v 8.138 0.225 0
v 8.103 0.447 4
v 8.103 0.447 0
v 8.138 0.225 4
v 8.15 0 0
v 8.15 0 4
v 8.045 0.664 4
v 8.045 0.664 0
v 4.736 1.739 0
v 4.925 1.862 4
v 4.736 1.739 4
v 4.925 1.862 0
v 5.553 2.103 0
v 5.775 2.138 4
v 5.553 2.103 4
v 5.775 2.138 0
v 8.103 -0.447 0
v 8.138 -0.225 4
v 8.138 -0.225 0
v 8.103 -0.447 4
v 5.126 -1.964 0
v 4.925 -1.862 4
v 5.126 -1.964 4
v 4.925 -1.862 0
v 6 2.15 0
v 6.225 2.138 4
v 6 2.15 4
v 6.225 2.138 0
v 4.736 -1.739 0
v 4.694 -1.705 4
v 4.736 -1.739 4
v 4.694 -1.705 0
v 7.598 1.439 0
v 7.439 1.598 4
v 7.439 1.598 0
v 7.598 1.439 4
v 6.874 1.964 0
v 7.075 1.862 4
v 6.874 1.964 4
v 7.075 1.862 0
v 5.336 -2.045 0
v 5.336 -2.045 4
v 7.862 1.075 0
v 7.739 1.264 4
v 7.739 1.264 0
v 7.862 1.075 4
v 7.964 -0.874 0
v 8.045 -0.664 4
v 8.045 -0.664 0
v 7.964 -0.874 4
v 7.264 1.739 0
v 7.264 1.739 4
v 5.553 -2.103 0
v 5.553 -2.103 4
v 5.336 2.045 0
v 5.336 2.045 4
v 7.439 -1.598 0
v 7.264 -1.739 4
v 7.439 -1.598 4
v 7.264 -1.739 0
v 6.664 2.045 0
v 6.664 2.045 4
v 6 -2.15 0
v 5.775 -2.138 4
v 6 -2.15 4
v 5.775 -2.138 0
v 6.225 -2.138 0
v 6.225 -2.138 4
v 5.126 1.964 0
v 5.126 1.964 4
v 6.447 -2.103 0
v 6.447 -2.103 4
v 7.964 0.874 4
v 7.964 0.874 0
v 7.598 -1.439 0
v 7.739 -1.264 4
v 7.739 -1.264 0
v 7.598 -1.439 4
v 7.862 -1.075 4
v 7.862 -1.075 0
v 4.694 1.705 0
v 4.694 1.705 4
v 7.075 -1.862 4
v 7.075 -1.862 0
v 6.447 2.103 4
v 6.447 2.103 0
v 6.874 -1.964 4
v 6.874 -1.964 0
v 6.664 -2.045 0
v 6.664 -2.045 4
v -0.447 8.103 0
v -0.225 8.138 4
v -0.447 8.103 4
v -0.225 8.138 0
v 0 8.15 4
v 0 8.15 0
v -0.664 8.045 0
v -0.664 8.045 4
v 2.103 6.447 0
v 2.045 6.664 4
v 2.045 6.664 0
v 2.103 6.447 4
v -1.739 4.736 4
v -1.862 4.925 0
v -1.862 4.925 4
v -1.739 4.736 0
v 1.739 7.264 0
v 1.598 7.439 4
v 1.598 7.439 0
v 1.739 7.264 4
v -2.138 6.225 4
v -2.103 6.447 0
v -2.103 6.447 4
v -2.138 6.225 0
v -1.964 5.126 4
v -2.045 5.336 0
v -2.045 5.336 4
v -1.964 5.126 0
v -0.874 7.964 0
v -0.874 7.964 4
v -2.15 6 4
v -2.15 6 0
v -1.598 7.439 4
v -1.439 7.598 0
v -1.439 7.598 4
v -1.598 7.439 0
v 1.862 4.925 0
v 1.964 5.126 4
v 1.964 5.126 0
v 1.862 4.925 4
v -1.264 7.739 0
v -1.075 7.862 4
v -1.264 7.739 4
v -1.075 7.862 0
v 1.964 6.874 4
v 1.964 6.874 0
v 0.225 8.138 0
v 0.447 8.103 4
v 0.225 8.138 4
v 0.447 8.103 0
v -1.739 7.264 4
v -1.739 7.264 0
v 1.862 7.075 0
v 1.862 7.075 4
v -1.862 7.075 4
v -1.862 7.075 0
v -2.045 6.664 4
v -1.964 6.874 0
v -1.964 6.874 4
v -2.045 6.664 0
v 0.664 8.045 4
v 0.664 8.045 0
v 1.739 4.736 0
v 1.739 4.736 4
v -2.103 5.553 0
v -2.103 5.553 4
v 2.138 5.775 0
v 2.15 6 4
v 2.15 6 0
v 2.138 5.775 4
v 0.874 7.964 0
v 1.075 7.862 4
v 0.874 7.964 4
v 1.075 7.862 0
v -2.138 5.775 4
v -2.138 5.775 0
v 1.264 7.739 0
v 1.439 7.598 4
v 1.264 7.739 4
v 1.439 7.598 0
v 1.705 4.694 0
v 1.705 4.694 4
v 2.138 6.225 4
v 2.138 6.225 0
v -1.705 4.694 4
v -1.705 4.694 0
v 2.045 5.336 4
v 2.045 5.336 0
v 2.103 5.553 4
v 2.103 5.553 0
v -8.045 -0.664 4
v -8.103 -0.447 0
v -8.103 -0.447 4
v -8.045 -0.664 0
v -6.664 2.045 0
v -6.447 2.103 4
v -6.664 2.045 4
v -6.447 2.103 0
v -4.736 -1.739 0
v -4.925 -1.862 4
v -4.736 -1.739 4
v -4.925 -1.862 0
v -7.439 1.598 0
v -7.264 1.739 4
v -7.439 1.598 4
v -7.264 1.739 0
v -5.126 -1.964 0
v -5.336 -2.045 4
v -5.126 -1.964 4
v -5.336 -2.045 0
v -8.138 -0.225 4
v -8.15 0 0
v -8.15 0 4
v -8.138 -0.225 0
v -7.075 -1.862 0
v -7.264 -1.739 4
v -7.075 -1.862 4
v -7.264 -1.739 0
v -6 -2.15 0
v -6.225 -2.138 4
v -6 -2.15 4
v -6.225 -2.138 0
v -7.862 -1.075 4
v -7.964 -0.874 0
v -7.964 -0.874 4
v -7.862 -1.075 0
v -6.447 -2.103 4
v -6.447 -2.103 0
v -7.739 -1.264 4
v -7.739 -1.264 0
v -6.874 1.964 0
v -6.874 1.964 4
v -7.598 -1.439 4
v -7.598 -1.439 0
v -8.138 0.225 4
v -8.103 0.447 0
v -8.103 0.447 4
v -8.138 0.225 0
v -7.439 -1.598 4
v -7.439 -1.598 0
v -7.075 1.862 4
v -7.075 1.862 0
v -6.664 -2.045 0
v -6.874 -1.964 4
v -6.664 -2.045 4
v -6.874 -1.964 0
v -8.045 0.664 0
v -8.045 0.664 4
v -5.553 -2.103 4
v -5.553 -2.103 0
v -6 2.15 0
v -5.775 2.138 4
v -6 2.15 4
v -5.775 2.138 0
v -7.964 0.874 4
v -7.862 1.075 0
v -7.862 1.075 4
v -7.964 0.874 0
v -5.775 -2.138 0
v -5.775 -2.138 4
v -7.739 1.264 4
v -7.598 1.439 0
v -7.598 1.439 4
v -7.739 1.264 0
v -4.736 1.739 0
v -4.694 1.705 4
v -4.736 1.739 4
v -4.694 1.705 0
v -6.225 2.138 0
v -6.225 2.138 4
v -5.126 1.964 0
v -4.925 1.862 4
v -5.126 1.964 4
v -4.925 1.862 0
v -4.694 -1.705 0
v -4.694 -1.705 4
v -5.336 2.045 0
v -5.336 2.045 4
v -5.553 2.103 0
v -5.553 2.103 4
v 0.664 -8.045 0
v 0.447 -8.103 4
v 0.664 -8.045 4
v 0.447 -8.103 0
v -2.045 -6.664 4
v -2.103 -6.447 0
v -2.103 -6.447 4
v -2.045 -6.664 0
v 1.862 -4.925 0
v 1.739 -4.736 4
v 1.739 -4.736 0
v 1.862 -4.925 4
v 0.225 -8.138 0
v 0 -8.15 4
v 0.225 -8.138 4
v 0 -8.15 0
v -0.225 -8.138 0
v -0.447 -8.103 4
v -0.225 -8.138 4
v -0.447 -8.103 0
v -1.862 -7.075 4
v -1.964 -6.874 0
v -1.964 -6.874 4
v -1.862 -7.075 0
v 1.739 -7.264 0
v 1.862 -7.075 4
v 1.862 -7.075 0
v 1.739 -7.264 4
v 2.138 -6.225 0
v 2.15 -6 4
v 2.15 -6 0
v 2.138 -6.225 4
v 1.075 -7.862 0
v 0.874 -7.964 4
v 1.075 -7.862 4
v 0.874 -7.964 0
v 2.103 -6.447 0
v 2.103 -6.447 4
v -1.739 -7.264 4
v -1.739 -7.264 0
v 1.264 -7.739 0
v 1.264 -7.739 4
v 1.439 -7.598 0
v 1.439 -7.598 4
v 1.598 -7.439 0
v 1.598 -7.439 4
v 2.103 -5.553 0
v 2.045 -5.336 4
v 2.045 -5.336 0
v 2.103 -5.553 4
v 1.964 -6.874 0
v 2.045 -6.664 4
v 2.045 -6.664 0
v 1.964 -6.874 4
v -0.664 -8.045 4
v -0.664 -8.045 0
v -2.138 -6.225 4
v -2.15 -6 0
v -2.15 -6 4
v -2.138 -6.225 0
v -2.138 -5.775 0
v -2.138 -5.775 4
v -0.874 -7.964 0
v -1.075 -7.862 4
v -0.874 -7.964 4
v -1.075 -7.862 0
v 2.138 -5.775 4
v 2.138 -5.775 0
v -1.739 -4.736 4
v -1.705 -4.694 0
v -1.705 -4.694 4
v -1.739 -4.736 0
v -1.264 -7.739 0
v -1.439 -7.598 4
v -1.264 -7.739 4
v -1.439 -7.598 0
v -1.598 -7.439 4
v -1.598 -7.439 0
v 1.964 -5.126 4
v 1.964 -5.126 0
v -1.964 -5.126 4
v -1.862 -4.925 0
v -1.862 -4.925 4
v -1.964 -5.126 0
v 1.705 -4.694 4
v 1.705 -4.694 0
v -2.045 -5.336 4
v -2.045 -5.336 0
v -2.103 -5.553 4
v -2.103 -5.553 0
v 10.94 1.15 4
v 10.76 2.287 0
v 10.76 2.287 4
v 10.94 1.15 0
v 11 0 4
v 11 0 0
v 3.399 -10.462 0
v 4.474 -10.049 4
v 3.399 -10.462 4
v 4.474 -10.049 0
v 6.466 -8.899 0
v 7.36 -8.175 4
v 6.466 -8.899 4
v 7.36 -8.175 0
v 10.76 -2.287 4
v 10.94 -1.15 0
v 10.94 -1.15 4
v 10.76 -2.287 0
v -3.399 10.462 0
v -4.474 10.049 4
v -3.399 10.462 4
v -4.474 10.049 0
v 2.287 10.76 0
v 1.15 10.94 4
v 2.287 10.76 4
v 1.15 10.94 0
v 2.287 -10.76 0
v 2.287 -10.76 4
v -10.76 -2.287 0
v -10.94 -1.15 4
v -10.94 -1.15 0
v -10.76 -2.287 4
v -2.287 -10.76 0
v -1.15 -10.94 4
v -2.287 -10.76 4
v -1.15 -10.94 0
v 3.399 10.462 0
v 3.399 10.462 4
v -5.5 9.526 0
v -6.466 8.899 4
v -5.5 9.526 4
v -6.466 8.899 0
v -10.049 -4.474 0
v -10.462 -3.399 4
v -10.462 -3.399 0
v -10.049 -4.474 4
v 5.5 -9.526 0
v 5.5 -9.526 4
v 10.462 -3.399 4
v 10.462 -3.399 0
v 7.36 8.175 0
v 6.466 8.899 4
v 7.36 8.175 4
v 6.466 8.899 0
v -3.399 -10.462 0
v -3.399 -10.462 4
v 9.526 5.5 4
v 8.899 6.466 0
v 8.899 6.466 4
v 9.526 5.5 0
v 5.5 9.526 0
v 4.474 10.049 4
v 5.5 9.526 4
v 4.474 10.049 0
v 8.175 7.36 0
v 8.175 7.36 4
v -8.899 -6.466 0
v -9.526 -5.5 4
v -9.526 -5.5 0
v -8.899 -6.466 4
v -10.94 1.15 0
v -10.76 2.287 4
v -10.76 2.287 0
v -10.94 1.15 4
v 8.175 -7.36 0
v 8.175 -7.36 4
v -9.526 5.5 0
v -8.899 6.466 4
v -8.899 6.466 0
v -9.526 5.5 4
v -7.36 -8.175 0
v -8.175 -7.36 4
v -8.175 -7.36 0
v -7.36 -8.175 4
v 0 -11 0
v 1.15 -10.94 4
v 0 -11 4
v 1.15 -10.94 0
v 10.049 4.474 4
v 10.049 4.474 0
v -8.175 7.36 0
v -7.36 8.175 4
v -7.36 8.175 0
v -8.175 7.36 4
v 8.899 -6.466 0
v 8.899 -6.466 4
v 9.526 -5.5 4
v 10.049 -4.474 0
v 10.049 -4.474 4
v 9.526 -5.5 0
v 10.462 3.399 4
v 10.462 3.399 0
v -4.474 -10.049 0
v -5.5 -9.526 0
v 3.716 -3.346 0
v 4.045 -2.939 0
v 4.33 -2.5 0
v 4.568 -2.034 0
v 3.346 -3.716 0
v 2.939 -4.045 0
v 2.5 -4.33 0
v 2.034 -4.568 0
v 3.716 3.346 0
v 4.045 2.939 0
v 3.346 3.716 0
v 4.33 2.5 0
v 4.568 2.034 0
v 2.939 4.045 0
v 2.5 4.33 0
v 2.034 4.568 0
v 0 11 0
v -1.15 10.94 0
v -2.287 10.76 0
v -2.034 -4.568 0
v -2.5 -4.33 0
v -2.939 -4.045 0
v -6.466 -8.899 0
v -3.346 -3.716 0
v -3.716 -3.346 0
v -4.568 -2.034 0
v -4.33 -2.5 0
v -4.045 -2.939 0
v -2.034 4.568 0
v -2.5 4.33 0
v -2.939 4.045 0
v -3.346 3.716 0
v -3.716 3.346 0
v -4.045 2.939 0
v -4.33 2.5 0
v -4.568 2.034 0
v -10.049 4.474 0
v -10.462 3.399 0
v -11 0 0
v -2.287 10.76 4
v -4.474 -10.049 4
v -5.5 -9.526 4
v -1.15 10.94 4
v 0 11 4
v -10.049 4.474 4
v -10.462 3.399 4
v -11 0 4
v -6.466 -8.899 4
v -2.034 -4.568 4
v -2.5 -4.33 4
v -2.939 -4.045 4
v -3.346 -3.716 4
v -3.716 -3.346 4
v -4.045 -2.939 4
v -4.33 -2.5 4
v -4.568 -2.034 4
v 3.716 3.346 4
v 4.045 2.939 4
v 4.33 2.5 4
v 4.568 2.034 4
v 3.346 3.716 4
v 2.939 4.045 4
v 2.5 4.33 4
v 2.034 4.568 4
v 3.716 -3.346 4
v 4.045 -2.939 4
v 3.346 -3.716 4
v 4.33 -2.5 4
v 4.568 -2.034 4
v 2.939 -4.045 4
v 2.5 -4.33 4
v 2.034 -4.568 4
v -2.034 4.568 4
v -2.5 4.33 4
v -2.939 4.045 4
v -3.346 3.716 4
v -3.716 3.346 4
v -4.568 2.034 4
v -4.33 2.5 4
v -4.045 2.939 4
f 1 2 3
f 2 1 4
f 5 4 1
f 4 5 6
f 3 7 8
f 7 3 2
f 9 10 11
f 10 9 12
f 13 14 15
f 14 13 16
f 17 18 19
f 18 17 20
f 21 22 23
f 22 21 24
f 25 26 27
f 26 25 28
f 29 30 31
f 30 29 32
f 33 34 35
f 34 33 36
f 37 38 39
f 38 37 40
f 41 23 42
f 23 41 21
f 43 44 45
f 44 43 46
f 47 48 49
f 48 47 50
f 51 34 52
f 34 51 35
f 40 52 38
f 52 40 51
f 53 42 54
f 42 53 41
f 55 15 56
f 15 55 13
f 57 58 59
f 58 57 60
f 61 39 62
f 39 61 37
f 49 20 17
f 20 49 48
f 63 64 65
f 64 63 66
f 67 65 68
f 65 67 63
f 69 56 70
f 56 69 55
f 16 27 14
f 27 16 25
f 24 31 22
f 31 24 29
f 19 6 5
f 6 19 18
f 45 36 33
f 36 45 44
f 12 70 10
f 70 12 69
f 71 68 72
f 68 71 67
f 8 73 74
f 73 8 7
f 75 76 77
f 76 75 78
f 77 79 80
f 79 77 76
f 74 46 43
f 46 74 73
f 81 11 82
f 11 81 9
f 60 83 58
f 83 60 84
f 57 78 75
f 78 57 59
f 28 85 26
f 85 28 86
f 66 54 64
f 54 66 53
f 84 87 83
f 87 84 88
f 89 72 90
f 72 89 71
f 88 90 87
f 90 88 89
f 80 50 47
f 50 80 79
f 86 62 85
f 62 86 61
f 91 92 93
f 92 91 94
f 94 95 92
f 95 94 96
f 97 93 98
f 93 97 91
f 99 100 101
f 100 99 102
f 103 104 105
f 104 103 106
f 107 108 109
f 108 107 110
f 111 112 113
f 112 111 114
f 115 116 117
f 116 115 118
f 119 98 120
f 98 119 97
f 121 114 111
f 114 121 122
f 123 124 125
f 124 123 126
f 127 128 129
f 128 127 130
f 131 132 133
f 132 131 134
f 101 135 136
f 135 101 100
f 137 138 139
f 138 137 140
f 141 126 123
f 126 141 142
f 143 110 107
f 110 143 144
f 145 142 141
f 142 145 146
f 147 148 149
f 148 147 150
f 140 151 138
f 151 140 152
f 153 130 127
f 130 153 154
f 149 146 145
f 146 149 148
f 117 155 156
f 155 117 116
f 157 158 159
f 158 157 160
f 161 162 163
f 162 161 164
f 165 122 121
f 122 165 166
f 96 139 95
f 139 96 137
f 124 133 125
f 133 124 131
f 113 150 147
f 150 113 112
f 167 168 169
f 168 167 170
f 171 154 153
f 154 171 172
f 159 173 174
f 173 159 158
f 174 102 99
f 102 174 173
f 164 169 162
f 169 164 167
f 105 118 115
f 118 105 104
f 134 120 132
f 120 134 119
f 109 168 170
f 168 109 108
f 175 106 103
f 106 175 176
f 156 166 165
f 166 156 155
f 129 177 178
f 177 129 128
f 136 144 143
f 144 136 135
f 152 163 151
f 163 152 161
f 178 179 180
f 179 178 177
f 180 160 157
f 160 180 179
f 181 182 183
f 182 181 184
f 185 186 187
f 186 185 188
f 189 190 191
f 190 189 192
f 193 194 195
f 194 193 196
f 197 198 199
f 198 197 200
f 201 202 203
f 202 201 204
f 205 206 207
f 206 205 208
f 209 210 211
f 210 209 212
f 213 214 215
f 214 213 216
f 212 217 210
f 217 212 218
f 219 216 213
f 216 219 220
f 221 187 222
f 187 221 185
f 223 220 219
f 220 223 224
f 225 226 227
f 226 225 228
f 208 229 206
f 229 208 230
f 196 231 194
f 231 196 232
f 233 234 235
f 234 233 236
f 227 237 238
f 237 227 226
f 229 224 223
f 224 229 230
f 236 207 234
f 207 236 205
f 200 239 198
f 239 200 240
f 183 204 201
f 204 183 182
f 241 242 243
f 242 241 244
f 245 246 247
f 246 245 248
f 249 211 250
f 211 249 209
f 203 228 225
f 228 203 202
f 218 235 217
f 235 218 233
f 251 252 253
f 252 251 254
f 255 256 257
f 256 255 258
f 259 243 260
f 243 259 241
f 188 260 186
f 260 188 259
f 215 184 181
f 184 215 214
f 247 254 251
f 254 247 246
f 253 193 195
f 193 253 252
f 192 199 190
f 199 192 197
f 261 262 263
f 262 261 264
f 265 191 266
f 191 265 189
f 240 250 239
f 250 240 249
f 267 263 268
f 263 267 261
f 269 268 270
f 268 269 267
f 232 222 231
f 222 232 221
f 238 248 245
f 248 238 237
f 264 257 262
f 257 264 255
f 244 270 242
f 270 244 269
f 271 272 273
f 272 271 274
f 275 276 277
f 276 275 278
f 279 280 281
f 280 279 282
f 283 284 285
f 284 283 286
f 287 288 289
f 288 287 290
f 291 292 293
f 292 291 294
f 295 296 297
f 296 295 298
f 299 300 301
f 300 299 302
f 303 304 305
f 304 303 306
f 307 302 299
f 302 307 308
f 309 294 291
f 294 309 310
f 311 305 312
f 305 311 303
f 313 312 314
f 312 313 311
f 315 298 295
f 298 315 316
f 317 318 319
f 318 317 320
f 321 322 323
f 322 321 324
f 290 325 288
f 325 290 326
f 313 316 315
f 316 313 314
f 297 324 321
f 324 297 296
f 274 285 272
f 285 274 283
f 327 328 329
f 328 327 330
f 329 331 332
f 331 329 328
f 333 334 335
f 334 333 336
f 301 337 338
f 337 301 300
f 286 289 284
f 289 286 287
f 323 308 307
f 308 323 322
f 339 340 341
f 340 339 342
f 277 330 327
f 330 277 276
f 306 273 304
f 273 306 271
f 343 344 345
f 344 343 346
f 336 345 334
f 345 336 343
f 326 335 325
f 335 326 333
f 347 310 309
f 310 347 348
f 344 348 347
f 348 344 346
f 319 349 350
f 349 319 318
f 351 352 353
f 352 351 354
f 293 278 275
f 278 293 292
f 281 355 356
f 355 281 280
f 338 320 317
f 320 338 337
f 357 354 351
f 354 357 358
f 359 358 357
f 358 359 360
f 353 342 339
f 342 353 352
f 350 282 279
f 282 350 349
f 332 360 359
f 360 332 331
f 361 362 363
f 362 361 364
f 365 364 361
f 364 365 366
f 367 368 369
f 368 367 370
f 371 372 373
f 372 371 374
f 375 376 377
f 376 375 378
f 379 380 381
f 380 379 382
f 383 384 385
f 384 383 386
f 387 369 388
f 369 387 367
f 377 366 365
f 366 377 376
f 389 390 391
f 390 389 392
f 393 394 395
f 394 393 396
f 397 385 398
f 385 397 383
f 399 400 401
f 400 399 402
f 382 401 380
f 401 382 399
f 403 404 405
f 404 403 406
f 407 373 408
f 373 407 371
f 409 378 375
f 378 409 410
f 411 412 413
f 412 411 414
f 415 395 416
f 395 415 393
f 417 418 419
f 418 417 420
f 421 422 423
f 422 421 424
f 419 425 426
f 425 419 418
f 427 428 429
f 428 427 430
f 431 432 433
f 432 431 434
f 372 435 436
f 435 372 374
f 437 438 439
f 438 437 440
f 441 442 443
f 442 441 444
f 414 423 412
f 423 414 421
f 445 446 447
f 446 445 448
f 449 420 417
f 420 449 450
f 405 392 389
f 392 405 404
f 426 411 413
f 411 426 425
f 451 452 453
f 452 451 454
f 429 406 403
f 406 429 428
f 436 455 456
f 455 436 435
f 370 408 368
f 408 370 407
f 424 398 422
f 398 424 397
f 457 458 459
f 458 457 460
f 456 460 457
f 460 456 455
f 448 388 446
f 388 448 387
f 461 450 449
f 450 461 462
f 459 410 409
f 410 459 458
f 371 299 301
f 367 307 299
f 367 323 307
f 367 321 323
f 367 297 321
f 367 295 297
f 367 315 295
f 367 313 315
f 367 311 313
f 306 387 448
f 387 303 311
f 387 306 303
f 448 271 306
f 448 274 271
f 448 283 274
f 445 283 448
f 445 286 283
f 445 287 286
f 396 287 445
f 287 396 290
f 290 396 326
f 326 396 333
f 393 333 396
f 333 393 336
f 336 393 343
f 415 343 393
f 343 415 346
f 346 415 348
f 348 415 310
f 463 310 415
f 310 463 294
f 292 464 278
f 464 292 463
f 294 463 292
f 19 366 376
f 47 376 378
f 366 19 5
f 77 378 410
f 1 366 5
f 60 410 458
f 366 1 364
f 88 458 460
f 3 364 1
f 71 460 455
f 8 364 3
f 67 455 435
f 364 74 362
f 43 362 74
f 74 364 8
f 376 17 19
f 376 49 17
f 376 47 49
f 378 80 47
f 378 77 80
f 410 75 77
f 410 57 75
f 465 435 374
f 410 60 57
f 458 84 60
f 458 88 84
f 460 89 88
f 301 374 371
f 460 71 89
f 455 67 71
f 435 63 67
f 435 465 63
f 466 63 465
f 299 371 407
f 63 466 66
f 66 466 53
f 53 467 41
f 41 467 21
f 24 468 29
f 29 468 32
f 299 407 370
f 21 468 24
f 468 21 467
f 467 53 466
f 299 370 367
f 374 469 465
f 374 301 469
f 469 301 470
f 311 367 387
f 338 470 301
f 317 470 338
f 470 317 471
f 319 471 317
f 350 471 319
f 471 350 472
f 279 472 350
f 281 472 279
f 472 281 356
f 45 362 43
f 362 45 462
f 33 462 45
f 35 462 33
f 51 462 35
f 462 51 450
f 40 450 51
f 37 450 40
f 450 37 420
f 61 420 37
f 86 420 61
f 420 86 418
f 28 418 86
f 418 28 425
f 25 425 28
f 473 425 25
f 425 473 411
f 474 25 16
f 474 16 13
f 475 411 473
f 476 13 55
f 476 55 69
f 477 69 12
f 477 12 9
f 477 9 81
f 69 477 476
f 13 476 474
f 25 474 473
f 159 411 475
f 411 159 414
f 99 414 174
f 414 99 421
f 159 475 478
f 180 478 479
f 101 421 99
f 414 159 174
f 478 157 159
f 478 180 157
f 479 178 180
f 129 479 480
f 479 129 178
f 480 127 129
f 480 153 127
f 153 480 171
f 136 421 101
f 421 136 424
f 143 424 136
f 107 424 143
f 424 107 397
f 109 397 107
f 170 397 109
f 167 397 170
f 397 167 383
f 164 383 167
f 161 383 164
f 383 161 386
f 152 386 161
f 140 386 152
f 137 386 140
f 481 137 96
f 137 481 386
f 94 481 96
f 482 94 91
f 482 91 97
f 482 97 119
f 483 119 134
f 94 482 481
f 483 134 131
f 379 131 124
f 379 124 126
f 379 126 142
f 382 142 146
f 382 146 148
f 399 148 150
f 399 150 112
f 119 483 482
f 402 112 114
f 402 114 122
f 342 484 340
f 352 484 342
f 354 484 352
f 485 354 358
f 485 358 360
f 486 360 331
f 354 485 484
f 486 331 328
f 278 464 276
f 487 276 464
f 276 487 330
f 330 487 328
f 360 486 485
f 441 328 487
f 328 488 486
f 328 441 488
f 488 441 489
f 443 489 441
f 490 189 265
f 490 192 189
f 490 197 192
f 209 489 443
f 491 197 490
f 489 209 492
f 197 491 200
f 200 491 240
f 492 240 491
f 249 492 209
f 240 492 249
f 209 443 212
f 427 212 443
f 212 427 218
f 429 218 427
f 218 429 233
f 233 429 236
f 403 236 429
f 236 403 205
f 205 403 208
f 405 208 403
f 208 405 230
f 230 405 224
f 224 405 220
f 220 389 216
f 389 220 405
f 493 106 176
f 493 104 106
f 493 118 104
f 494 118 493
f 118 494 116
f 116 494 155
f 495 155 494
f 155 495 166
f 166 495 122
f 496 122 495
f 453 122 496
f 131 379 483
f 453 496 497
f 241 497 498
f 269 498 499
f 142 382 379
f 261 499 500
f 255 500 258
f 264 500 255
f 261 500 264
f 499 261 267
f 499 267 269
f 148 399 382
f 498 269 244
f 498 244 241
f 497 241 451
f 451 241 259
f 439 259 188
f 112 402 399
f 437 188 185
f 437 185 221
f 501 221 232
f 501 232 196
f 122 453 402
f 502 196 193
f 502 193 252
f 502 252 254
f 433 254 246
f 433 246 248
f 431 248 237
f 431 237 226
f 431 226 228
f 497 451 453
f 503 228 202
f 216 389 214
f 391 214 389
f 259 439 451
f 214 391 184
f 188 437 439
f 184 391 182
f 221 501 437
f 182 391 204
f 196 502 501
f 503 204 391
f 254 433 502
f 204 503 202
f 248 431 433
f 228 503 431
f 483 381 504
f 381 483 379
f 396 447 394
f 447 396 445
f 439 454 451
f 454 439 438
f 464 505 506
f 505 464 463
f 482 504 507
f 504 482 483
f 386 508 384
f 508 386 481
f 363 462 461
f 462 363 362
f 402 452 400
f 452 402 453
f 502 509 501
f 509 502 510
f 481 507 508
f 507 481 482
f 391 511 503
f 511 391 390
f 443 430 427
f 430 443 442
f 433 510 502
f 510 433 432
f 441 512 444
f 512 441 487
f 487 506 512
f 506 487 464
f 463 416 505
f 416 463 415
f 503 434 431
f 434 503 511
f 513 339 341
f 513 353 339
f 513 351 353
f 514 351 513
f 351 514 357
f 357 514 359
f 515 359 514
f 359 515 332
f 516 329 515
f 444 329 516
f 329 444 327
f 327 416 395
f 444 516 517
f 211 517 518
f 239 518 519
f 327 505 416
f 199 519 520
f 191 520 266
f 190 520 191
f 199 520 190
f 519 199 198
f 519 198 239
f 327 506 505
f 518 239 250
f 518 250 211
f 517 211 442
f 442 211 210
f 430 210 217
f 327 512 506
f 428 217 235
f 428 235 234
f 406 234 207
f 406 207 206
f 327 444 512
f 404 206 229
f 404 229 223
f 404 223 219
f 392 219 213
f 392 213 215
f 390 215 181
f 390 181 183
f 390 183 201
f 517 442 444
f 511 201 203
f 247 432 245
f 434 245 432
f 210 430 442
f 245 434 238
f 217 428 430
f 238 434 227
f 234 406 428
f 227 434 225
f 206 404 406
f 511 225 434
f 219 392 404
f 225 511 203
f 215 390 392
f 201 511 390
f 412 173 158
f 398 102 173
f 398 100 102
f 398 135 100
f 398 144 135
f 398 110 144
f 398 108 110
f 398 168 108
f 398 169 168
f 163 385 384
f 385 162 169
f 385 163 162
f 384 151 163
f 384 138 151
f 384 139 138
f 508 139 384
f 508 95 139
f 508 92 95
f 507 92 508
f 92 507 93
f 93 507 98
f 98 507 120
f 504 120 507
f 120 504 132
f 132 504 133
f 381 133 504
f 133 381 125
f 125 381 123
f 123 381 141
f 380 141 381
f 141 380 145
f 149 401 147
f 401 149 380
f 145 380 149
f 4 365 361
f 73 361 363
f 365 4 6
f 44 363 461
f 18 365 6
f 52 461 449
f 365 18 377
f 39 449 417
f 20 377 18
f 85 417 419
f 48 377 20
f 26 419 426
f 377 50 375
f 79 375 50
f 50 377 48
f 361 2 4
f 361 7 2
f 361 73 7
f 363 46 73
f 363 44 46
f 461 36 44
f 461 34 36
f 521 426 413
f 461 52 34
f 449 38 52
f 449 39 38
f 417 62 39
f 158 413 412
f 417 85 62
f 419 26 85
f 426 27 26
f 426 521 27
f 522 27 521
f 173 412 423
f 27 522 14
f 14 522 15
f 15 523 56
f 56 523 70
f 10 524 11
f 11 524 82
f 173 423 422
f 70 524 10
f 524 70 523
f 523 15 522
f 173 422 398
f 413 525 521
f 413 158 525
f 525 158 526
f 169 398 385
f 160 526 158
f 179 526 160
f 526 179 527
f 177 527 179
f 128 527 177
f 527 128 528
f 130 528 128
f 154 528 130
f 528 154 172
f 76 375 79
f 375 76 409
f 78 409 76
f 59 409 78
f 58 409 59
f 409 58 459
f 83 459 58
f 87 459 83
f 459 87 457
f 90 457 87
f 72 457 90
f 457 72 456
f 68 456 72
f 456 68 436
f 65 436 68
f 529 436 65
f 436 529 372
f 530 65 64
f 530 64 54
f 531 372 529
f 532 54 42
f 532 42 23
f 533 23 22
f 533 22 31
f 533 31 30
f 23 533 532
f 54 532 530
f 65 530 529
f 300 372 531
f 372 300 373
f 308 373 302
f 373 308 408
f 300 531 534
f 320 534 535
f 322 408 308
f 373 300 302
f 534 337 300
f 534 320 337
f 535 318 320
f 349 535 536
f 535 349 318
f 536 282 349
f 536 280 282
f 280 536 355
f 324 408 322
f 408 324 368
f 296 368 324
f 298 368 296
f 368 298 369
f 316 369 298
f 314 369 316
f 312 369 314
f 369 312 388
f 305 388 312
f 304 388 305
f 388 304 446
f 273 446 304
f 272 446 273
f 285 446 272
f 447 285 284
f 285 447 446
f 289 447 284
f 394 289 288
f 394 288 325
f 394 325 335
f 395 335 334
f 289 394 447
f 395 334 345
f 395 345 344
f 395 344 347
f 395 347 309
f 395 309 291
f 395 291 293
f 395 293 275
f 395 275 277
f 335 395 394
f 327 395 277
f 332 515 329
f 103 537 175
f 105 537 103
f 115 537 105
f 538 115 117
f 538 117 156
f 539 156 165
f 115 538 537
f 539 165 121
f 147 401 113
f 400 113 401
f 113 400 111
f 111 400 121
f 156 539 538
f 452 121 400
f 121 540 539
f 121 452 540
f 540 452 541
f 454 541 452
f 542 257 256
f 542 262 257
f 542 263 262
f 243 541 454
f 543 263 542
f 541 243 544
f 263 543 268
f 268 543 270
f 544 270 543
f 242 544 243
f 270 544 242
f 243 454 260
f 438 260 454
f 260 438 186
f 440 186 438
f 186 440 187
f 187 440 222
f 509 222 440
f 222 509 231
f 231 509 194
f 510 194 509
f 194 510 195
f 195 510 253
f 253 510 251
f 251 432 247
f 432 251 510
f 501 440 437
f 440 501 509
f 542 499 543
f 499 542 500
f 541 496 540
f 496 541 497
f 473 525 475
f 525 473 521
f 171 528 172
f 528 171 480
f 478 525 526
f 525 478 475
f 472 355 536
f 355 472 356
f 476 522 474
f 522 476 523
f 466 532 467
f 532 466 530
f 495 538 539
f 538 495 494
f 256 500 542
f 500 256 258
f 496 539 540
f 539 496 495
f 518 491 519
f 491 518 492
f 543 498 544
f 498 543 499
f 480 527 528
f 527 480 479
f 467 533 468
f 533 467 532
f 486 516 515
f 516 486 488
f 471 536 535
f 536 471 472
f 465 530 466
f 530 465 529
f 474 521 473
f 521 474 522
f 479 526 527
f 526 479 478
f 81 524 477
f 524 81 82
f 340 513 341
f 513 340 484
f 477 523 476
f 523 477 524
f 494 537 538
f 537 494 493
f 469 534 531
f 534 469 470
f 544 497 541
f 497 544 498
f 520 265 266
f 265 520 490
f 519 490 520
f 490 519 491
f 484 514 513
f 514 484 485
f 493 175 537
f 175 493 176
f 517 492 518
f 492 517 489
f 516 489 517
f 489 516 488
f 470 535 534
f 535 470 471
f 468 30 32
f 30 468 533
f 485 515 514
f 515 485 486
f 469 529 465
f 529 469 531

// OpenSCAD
// Shaft-seal holder plate.
$fn = 60;
eps = 0.02;
seal_d = 10;
outer_d = 22;
plate_t = 4;
difference() { cylinder(d=outer_d,h=plate_t); translate([0,0,-eps]) cylinder(d=seal_d,h=plate_t+2*eps); for(i=[0:3]) rotate([0,0,i*90]) translate([outer_d/2-5,0,-eps]) cylinder(d=4.3,h=plate_t+2*eps); }
